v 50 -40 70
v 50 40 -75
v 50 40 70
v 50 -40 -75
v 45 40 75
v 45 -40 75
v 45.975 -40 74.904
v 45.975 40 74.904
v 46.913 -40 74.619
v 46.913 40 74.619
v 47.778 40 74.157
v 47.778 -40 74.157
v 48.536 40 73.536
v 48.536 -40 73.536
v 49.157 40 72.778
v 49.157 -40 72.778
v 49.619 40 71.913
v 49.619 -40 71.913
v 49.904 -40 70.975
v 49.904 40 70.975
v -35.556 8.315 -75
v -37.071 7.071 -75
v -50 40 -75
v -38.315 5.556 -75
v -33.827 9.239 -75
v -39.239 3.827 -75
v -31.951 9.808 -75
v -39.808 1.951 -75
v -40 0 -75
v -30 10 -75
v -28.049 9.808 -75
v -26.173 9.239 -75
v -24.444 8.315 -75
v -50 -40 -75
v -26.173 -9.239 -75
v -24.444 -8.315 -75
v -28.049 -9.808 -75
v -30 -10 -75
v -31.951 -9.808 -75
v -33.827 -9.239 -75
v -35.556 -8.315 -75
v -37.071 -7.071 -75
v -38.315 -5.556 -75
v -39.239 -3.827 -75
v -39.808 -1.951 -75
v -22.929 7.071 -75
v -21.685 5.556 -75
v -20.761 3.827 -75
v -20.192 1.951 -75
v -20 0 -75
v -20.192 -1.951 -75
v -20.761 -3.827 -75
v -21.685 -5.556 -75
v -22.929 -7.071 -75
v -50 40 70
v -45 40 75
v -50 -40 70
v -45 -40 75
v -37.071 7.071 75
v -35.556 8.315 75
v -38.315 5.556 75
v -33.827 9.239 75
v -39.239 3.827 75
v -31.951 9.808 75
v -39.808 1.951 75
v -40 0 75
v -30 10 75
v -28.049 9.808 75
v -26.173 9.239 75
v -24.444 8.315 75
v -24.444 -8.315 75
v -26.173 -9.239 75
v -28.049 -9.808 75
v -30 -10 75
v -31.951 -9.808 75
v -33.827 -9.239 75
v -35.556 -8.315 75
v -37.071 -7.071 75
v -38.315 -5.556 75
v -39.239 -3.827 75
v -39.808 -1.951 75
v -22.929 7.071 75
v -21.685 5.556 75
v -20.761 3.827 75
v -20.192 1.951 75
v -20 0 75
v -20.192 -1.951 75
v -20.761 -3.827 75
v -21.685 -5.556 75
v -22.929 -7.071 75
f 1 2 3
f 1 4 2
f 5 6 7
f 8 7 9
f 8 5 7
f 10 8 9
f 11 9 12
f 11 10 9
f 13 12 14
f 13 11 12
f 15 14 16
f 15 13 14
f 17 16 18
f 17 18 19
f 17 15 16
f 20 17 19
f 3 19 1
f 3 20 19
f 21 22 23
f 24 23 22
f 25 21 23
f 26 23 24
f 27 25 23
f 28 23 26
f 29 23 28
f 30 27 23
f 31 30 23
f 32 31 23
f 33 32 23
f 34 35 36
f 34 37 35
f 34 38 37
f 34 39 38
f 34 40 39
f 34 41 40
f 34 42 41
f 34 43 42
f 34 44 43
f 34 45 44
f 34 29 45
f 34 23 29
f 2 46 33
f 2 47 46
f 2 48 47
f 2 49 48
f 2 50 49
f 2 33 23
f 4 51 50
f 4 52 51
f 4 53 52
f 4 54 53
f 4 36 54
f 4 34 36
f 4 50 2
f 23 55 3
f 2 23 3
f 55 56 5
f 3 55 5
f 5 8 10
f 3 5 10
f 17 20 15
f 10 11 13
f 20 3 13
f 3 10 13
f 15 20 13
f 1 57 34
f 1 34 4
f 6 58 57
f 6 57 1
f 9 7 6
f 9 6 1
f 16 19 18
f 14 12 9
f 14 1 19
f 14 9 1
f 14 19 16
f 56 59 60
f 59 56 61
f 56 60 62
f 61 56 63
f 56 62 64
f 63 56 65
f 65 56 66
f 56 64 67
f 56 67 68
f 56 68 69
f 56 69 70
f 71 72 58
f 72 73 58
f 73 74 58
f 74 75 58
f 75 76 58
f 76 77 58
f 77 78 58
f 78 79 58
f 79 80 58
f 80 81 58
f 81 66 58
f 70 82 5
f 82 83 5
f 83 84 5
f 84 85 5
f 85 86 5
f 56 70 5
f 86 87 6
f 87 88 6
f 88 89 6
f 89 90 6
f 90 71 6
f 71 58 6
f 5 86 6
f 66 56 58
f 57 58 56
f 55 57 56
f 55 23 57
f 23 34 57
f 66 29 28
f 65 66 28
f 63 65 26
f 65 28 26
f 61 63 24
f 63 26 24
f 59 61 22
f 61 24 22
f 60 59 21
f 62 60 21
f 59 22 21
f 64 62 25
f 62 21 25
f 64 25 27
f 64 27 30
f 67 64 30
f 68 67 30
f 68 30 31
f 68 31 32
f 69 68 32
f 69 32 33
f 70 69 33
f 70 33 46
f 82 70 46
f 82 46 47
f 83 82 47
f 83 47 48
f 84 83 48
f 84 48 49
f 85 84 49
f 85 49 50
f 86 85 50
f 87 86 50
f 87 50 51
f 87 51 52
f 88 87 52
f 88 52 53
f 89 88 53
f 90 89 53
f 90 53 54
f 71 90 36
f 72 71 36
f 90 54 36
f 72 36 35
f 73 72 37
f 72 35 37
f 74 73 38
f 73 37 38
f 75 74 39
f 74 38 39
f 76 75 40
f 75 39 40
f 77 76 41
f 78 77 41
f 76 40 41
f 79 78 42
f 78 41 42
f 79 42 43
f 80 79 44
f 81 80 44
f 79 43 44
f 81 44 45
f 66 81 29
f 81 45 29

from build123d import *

# Parameters (mm, degrees)
F0_W     = 100
F0_H     = 150
F1_DEPTH = 40
F3_D     = 20
F4_SIZE  = 5
F5_R     = 5


with BuildPart() as f1:
    # F0 (on Front) → F1 (new body, symmetric)
    with BuildSketch(Plane.XZ):
        Rectangle(F0_W, F0_H)
    extrude(amount=F1_DEPTH, both=True)

    # F3 (through all)
    with Locations(Plane.XY.offset(75)):
        with Locations((-30, 0)):
            Hole(F3_D / 2)

    # F4
    f4_edges = [f1.edges().sort_by_distance(p)[0] for p in [
        (-50, 0, 75),
    ]]
    chamfer(f4_edges, length=F4_SIZE)

    # F5
    f5_edges = [f1.edges().sort_by_distance(p)[0] for p in [
        (50, 0, 75),
    ]]
    fillet(f5_edges, radius=F5_R)


solid = f1.part
